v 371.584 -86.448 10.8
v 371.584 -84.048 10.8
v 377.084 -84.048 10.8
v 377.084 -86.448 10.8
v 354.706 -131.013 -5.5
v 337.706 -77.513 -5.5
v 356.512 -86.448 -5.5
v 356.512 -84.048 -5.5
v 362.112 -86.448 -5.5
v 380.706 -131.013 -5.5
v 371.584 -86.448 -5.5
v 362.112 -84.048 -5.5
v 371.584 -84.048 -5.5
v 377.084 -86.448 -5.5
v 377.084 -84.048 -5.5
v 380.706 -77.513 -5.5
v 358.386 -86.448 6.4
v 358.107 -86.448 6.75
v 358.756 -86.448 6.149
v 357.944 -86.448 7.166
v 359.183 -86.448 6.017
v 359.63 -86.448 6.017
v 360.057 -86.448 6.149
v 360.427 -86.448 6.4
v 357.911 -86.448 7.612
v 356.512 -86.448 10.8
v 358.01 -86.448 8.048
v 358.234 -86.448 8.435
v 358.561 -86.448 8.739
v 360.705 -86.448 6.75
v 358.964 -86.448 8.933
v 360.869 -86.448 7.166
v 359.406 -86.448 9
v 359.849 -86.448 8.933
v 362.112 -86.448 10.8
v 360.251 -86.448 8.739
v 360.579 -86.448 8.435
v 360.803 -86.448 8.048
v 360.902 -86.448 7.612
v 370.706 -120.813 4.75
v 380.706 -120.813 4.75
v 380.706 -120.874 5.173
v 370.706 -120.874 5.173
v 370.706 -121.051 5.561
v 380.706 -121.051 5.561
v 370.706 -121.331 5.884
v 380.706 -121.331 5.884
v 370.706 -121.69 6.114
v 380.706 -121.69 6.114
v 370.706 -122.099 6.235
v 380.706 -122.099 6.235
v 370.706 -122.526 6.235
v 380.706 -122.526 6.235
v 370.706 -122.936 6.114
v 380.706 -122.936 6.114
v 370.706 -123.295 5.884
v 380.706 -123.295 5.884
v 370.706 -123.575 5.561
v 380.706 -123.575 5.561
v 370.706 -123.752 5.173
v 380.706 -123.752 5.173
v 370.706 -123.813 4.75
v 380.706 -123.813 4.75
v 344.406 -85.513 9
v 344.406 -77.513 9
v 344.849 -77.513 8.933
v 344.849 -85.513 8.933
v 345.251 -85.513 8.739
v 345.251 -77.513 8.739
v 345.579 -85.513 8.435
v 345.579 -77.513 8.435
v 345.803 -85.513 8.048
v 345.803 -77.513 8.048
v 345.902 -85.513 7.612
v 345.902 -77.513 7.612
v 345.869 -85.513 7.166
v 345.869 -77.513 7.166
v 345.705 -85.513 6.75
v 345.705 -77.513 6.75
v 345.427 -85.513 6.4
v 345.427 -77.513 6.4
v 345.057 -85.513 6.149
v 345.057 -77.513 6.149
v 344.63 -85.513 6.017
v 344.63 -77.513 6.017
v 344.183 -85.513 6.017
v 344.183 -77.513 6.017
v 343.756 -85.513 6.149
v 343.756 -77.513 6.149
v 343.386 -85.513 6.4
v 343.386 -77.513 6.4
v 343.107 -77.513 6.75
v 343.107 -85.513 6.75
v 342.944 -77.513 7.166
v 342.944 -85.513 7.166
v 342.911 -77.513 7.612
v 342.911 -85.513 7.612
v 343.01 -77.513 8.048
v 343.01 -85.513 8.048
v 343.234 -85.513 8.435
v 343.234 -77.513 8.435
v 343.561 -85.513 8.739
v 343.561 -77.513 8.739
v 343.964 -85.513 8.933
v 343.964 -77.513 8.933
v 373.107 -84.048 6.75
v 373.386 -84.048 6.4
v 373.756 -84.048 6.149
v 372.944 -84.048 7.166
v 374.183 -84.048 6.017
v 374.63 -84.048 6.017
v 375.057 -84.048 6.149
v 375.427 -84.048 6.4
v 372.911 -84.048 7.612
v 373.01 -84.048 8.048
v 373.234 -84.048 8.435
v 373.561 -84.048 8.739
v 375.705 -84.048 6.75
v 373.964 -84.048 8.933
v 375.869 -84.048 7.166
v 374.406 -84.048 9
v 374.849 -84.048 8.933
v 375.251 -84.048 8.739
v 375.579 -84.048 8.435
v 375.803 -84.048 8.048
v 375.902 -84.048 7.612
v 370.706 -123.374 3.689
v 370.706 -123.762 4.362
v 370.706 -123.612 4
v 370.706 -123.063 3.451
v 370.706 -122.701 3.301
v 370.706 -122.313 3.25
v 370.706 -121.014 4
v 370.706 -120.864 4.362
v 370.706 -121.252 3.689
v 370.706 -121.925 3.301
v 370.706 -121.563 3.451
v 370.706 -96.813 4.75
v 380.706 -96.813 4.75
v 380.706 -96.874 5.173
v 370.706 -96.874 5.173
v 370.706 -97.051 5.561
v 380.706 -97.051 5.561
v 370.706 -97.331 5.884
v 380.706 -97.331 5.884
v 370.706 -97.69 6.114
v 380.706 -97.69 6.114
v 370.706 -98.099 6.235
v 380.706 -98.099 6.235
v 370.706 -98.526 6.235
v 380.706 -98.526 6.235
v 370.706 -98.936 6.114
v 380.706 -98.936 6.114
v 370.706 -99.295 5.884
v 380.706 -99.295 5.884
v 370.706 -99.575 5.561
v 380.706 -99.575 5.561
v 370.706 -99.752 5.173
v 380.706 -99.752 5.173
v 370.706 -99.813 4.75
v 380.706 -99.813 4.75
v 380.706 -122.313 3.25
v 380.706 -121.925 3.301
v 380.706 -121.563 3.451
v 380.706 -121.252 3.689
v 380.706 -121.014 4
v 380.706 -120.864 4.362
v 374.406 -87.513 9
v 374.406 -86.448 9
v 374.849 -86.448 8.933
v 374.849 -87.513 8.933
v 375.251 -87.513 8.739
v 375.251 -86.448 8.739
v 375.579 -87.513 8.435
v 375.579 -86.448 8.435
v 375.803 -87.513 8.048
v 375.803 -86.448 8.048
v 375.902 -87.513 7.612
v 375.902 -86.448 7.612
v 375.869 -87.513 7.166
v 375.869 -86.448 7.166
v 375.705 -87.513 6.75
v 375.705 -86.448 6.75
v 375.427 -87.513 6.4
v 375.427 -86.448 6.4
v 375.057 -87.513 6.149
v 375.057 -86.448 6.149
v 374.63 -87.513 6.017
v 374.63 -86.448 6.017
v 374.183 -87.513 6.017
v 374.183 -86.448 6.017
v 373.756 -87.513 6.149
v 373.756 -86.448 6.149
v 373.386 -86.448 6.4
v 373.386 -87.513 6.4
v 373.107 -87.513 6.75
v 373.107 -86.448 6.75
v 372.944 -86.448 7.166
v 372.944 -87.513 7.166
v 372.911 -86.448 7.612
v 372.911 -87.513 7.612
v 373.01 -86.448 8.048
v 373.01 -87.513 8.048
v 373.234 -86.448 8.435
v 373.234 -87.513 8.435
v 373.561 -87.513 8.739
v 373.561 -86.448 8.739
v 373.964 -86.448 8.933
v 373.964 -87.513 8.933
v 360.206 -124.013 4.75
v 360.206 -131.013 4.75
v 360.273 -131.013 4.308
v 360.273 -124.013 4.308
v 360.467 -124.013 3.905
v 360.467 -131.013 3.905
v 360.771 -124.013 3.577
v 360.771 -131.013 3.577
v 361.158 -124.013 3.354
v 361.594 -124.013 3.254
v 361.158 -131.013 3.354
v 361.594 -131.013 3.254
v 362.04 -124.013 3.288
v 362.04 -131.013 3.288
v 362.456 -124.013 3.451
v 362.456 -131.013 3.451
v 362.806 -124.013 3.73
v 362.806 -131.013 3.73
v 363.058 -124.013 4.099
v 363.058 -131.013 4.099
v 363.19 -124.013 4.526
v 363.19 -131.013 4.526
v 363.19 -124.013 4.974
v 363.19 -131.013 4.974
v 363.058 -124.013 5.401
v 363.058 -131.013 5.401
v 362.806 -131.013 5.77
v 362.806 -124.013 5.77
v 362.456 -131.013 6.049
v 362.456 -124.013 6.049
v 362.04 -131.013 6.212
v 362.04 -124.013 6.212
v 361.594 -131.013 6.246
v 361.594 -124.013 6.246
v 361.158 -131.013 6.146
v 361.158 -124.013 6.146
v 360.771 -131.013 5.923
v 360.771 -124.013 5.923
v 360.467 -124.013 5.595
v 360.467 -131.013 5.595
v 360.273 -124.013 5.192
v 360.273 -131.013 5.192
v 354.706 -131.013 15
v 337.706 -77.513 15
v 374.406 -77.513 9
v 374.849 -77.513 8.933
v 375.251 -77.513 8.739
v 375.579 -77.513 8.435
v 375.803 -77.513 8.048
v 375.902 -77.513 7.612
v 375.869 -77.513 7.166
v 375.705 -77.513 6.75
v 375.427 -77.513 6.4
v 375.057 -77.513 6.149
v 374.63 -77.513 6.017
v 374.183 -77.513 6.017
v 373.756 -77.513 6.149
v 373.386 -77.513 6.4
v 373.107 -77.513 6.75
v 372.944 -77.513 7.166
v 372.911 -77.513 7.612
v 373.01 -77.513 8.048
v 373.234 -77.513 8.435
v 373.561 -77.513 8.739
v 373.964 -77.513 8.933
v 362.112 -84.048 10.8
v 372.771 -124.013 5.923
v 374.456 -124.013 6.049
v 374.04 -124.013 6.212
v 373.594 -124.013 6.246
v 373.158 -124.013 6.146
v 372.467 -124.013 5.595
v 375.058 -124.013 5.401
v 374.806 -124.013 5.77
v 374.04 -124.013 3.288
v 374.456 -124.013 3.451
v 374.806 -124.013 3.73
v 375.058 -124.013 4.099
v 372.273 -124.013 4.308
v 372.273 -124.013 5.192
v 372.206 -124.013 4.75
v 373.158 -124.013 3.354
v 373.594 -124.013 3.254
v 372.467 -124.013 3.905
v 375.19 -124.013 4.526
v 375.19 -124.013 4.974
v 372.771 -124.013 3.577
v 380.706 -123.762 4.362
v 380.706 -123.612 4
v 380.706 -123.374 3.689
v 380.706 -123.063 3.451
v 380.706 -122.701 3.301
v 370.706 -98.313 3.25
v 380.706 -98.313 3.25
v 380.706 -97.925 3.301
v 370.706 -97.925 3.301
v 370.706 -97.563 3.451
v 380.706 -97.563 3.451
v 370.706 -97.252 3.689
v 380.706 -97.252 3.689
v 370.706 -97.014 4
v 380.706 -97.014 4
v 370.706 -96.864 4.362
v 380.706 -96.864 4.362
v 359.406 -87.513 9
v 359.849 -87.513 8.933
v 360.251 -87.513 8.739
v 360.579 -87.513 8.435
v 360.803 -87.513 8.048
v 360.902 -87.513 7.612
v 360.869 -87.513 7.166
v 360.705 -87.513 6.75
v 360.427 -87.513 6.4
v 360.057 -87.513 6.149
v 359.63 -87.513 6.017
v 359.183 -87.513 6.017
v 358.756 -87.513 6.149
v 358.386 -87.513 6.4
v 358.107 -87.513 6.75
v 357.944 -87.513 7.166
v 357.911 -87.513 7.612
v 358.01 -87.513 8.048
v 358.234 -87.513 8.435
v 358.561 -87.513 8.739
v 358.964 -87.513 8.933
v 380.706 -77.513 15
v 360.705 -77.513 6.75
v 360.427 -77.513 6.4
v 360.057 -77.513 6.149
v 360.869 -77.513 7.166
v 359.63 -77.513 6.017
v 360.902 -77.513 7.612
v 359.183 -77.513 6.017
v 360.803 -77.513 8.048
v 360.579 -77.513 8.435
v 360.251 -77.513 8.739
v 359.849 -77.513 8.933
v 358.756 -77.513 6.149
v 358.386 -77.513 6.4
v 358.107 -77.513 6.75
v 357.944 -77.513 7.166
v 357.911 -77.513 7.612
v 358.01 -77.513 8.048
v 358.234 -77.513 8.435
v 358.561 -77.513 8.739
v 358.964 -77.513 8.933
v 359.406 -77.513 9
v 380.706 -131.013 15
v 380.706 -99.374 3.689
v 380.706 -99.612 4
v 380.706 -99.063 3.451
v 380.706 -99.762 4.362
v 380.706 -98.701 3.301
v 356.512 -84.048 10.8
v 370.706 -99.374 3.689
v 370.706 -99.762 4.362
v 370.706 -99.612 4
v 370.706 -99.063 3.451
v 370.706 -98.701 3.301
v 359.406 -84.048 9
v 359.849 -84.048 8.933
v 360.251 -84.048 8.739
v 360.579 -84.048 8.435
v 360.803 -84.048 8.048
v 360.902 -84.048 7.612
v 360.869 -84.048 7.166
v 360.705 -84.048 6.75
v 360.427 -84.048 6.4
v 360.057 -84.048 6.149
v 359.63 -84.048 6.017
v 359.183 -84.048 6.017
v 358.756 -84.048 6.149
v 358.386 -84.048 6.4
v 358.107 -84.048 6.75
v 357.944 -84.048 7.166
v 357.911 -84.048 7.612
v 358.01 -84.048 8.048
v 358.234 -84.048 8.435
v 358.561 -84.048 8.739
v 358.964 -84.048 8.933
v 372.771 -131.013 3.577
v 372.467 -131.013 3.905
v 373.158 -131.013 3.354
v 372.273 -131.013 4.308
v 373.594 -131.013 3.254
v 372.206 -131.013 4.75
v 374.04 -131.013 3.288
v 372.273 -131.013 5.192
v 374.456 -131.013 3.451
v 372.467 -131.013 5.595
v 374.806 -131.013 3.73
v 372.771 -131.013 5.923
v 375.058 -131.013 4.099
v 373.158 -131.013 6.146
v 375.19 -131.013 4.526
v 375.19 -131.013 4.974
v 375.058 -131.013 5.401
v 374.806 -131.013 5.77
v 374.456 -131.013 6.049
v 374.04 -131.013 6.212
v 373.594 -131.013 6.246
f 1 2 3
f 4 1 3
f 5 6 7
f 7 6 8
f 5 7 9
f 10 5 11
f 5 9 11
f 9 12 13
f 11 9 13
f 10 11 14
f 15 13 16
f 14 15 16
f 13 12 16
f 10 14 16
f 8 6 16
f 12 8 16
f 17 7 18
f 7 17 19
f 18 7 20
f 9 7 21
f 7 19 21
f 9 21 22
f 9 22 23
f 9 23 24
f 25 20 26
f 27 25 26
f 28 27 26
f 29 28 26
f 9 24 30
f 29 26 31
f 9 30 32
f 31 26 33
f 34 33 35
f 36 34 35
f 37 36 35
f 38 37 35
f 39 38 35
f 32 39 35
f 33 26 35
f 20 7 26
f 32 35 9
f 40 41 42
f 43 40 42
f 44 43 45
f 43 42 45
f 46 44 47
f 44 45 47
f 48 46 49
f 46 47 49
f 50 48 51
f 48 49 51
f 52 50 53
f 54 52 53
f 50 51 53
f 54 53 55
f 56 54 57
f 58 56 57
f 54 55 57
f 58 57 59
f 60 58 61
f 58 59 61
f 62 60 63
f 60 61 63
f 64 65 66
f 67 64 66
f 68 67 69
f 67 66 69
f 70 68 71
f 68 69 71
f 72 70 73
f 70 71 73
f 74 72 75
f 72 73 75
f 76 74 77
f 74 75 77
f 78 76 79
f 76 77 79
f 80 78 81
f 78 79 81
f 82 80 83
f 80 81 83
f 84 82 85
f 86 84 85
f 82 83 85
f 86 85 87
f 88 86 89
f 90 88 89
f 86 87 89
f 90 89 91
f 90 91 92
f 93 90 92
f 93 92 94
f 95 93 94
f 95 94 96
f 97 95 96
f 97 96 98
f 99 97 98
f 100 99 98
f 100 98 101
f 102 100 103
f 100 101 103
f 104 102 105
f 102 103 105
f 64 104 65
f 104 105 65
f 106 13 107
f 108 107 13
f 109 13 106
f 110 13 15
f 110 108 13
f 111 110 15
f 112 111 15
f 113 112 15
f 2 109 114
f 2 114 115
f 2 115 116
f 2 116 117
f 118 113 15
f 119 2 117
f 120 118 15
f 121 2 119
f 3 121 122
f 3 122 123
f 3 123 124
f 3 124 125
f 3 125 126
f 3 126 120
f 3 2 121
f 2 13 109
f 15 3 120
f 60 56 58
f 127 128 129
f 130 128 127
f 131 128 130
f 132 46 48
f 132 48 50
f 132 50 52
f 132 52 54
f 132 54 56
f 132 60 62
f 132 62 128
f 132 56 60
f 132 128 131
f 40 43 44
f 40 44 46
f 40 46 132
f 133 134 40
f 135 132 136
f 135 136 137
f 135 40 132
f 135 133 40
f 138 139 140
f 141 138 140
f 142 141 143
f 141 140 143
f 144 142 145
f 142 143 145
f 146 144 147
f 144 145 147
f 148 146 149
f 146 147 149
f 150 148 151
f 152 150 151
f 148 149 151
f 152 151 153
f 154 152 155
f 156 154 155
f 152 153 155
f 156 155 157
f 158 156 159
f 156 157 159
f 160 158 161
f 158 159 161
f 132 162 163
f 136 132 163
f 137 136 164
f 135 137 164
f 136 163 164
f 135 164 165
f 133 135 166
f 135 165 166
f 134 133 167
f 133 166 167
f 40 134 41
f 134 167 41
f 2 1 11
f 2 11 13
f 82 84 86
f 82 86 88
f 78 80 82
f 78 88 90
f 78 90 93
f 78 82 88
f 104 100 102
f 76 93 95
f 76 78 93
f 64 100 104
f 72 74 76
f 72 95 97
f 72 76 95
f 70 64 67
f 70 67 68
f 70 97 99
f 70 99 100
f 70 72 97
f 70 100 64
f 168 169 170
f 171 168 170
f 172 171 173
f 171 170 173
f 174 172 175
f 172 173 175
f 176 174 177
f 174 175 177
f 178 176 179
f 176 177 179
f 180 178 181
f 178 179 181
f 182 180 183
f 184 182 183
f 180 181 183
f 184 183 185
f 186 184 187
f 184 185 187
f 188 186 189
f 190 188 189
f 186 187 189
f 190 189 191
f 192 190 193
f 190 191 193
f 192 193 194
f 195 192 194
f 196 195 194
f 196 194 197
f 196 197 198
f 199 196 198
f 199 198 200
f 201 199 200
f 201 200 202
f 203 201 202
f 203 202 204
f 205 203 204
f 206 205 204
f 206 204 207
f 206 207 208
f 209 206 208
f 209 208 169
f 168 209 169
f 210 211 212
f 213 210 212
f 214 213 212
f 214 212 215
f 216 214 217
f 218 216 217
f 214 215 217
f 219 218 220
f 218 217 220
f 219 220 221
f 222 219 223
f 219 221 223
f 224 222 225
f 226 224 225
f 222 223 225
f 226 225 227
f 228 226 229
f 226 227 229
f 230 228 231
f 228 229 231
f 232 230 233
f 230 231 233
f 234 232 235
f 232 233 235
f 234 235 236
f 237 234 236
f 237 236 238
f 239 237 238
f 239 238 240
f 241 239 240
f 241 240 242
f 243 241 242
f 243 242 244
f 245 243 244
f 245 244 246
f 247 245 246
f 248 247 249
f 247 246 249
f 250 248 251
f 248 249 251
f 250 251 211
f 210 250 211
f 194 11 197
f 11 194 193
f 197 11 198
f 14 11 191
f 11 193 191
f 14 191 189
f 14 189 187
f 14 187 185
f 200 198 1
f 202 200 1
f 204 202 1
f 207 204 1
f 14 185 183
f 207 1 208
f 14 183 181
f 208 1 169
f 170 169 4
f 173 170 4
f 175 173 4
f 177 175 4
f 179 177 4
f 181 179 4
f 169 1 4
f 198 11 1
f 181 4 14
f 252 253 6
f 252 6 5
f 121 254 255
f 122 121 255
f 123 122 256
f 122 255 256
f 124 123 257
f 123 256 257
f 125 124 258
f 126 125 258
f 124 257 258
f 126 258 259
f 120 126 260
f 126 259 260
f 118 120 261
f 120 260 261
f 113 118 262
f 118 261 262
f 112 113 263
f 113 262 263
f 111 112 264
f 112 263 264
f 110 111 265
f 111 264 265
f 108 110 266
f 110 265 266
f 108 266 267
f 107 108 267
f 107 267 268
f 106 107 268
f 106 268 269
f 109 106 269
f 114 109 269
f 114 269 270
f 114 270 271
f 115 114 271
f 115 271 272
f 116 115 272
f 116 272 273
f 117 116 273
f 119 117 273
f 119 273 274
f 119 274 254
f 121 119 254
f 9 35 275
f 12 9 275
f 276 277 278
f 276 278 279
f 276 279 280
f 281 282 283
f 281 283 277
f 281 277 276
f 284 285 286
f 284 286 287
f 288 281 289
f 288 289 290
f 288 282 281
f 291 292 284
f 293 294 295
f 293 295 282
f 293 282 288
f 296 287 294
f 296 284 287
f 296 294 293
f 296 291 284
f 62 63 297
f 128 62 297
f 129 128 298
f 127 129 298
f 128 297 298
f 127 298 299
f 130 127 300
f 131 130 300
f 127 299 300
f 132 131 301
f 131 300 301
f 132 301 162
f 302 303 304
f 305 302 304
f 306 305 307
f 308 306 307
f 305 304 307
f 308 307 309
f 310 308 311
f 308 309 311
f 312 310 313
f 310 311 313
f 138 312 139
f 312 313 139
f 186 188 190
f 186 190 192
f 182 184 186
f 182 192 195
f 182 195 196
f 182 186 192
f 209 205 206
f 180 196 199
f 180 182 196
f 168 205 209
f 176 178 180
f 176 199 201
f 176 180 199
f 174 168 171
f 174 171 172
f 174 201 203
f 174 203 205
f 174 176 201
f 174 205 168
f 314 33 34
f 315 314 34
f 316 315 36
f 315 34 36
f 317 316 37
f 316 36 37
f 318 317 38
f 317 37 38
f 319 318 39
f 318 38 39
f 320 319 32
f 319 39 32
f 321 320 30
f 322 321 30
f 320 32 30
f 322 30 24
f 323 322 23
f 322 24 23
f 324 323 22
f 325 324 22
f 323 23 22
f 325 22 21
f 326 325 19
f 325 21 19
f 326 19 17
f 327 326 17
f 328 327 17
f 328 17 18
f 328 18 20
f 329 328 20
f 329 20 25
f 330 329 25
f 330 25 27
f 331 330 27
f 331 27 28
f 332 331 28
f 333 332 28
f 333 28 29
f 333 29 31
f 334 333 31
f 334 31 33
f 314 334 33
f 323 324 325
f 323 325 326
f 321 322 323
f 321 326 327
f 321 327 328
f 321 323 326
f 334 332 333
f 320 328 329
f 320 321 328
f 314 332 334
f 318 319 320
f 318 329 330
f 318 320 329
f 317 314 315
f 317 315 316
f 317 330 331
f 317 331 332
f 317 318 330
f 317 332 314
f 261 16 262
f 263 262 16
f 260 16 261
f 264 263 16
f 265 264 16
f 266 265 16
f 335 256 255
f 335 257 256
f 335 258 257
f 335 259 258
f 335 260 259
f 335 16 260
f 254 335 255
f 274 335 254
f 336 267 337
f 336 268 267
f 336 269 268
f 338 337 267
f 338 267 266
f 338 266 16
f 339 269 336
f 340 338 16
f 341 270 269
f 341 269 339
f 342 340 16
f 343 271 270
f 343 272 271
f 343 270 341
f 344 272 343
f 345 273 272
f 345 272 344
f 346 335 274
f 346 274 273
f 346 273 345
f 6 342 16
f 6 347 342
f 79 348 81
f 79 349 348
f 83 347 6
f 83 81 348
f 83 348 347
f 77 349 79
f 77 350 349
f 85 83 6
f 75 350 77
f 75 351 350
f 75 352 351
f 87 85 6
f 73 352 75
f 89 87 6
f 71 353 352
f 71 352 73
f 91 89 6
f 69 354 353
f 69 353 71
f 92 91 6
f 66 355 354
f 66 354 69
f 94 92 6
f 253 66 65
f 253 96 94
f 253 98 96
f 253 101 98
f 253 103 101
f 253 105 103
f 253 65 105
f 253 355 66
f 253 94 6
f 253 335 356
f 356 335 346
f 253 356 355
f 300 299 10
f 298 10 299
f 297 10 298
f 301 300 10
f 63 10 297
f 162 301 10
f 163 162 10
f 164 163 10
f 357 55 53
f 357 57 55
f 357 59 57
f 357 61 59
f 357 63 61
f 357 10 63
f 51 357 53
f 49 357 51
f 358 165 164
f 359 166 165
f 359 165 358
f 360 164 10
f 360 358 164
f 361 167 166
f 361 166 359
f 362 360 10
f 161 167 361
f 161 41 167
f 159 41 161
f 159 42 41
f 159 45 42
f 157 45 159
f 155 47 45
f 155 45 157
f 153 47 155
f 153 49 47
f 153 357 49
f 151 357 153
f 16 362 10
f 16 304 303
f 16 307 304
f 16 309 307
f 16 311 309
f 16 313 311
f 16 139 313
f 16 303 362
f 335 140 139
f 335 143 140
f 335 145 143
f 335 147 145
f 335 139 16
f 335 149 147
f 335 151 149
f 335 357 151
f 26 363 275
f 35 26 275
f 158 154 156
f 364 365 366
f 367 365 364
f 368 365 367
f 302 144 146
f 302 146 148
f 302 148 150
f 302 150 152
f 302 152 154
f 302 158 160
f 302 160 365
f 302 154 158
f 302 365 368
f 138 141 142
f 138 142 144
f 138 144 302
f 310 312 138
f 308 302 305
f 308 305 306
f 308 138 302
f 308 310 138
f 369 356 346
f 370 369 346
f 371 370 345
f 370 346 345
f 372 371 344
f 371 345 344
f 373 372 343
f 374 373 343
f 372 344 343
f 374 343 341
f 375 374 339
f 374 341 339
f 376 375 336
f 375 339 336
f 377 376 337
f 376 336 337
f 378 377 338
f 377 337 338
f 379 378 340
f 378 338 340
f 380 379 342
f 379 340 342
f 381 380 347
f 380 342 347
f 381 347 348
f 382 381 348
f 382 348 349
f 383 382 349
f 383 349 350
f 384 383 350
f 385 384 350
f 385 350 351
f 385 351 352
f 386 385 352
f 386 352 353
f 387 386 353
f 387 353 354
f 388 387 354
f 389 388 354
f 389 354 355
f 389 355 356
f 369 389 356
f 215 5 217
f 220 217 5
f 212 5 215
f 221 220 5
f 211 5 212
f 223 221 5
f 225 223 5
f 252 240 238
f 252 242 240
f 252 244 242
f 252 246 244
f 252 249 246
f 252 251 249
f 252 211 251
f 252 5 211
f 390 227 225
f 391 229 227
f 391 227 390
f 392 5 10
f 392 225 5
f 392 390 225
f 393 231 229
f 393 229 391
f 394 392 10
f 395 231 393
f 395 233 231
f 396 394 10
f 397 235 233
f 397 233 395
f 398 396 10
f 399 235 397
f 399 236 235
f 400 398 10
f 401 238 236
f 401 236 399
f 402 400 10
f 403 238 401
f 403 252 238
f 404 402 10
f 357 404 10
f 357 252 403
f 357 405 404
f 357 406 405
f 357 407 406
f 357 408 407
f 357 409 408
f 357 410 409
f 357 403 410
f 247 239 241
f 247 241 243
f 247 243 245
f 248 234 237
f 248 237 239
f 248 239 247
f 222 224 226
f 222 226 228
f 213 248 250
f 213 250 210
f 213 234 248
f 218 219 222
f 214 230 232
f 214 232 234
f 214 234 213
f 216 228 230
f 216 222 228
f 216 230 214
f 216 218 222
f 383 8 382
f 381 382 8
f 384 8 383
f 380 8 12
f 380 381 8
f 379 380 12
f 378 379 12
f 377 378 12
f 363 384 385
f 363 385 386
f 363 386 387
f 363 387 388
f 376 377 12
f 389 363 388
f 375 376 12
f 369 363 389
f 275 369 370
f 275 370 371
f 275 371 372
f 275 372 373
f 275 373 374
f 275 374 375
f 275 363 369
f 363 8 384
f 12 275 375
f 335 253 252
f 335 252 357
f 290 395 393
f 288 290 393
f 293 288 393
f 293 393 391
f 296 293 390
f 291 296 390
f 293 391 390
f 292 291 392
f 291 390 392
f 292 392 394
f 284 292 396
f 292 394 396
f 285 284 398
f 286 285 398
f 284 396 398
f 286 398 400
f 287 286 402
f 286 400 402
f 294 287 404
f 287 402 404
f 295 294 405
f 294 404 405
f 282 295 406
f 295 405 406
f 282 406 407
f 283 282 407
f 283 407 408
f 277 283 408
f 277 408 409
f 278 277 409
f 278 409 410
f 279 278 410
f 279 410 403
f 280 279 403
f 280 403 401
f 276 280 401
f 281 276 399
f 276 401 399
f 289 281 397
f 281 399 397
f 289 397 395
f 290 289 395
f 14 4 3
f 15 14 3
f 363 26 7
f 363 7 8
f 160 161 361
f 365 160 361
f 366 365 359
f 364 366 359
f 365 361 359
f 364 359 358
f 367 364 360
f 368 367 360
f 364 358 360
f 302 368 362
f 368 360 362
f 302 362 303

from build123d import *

# Parameters (mm, degrees)
BOSS_EXTRUDE2_DEPTH = 15
SKETCH5_R           = 1.5
CUT_EXTRUDE3_DEPTH  = 8
BOSS_EXTRUDE4_DEPTH = 5.5
SKETCH8_R           = 1.5
CUT_EXTRUDE4_DEPTH  = 10
SKETCH9_R           = 1.5
CUT_EXTRUDE5_DEPTH  = 7
SKETCH5_4_R         = 1.5
CUT_EXTRUDE6_DEPTH  = 10
SKETCH10_W          = 5.6
SKETCH10_H          = 2.4
SKETCH10_W_2        = 5.5
CUT_EXTRUDE7_DEPTH  = 24
SKETCH10_3_W        = 5.6
SKETCH10_3_H        = 2.4
SKETCH10_3_W_2      = 5.5
BOSS_EXTRUDE5_DEPTH = 4.2


with BuildPart() as part:
    # Sketch3 → Boss-Extrude2 (new body)
    with BuildSketch(Plane.XY):
        Polygon((380.706426849, -77.512840587), (380.706426849, -131.012840587), (354.706426849, -131.012840587), (337.706426849, -77.512840587), align=None)
    extrude(amount=BOSS_EXTRUDE2_DEPTH)

    # Sketch5 → Cut-Extrude3 (cut)
    with BuildSketch(Plane(origin=(0, -77.512840587, 0), x_dir=(1, 0, 0), z_dir=(0, 1, 0))):
        with Locations((344.406426849, -7.5)):
            Circle(SKETCH5_R)
        with Locations((359.406426849, -7.5)):
            Circle(SKETCH5_R)
        with Locations((374.406426849, -7.5)):
            Circle(SKETCH5_R)
    extrude(amount=-CUT_EXTRUDE3_DEPTH, mode=Mode.SUBTRACT)

    # Sketch7 → Boss-Extrude4 (add)
    with BuildSketch(Plane(origin=(0, 0, 0), x_dir=(-1, 0, 0), z_dir=(0, 0, -1))):
        Polygon((-380.706426849, -77.512840587), (-337.706426849, -77.512840587), (-354.706426849, -131.012840587), (-380.706426849, -131.012840587), align=None)
    extrude(amount=BOSS_EXTRUDE4_DEPTH)

    # Sketch8 → Cut-Extrude4 (cut)
    with BuildSketch(Plane(origin=(380.706426849, 0, 0), x_dir=(0, 0, -1), z_dir=(1, 0, 0))):
        with Locations((-4.75, -98.312840587)):
            Circle(SKETCH8_R)
        with Locations((-4.75, -122.312840587)):
            Circle(SKETCH8_R)
    extrude(amount=-CUT_EXTRUDE4_DEPTH, mode=Mode.SUBTRACT)

    # Sketch9 → Cut-Extrude5 (cut)
    with BuildSketch(Plane(origin=(0, -131.012840587, 0), x_dir=(-1, 0, 0), z_dir=(0, -1, 0))):
        with Locations((-361.706426849, -4.75)):
            Circle(SKETCH9_R)
        with Locations((-373.706426849, -4.75)):
            Circle(SKETCH9_R)
    extrude(amount=-CUT_EXTRUDE5_DEPTH, mode=Mode.SUBTRACT)

    # Sketch5<4> → Cut-Extrude6 (cut)
    with BuildSketch(Plane(origin=(0, -77.512840587, 0), x_dir=(1, 0, 0), z_dir=(0, 1, 0))):
        with Locations((359.406426849, -7.5)):
            Circle(SKETCH5_4_R)
        with Locations((374.406426849, -7.5)):
            Circle(SKETCH5_4_R)
    extrude(amount=-CUT_EXTRUDE6_DEPTH, mode=Mode.SUBTRACT)

    # Sketch10 → Cut-Extrude7 (cut)
    with BuildSketch(Plane.XY.offset(15)):
        with Locations((359.312441298, -85.248108343)):
            Rectangle(SKETCH10_W, SKETCH10_H)
        with Locations((374.333669077, -85.248108343)):
            Rectangle(SKETCH10_W_2, SKETCH10_H)
    extrude(amount=-CUT_EXTRUDE7_DEPTH, mode=Mode.SUBTRACT)

    # Sketch10<3> → Boss-Extrude5 (add)
    with BuildSketch(Plane.XY.offset(15)):
        with Locations((359.312441298, -85.248108343)):
            Rectangle(SKETCH10_3_W, SKETCH10_3_H)
        with Locations((374.333669077, -85.248108343)):
            Rectangle(SKETCH10_3_W_2, SKETCH10_3_H)
    extrude(amount=-BOSS_EXTRUDE5_DEPTH)


solid = part.part
